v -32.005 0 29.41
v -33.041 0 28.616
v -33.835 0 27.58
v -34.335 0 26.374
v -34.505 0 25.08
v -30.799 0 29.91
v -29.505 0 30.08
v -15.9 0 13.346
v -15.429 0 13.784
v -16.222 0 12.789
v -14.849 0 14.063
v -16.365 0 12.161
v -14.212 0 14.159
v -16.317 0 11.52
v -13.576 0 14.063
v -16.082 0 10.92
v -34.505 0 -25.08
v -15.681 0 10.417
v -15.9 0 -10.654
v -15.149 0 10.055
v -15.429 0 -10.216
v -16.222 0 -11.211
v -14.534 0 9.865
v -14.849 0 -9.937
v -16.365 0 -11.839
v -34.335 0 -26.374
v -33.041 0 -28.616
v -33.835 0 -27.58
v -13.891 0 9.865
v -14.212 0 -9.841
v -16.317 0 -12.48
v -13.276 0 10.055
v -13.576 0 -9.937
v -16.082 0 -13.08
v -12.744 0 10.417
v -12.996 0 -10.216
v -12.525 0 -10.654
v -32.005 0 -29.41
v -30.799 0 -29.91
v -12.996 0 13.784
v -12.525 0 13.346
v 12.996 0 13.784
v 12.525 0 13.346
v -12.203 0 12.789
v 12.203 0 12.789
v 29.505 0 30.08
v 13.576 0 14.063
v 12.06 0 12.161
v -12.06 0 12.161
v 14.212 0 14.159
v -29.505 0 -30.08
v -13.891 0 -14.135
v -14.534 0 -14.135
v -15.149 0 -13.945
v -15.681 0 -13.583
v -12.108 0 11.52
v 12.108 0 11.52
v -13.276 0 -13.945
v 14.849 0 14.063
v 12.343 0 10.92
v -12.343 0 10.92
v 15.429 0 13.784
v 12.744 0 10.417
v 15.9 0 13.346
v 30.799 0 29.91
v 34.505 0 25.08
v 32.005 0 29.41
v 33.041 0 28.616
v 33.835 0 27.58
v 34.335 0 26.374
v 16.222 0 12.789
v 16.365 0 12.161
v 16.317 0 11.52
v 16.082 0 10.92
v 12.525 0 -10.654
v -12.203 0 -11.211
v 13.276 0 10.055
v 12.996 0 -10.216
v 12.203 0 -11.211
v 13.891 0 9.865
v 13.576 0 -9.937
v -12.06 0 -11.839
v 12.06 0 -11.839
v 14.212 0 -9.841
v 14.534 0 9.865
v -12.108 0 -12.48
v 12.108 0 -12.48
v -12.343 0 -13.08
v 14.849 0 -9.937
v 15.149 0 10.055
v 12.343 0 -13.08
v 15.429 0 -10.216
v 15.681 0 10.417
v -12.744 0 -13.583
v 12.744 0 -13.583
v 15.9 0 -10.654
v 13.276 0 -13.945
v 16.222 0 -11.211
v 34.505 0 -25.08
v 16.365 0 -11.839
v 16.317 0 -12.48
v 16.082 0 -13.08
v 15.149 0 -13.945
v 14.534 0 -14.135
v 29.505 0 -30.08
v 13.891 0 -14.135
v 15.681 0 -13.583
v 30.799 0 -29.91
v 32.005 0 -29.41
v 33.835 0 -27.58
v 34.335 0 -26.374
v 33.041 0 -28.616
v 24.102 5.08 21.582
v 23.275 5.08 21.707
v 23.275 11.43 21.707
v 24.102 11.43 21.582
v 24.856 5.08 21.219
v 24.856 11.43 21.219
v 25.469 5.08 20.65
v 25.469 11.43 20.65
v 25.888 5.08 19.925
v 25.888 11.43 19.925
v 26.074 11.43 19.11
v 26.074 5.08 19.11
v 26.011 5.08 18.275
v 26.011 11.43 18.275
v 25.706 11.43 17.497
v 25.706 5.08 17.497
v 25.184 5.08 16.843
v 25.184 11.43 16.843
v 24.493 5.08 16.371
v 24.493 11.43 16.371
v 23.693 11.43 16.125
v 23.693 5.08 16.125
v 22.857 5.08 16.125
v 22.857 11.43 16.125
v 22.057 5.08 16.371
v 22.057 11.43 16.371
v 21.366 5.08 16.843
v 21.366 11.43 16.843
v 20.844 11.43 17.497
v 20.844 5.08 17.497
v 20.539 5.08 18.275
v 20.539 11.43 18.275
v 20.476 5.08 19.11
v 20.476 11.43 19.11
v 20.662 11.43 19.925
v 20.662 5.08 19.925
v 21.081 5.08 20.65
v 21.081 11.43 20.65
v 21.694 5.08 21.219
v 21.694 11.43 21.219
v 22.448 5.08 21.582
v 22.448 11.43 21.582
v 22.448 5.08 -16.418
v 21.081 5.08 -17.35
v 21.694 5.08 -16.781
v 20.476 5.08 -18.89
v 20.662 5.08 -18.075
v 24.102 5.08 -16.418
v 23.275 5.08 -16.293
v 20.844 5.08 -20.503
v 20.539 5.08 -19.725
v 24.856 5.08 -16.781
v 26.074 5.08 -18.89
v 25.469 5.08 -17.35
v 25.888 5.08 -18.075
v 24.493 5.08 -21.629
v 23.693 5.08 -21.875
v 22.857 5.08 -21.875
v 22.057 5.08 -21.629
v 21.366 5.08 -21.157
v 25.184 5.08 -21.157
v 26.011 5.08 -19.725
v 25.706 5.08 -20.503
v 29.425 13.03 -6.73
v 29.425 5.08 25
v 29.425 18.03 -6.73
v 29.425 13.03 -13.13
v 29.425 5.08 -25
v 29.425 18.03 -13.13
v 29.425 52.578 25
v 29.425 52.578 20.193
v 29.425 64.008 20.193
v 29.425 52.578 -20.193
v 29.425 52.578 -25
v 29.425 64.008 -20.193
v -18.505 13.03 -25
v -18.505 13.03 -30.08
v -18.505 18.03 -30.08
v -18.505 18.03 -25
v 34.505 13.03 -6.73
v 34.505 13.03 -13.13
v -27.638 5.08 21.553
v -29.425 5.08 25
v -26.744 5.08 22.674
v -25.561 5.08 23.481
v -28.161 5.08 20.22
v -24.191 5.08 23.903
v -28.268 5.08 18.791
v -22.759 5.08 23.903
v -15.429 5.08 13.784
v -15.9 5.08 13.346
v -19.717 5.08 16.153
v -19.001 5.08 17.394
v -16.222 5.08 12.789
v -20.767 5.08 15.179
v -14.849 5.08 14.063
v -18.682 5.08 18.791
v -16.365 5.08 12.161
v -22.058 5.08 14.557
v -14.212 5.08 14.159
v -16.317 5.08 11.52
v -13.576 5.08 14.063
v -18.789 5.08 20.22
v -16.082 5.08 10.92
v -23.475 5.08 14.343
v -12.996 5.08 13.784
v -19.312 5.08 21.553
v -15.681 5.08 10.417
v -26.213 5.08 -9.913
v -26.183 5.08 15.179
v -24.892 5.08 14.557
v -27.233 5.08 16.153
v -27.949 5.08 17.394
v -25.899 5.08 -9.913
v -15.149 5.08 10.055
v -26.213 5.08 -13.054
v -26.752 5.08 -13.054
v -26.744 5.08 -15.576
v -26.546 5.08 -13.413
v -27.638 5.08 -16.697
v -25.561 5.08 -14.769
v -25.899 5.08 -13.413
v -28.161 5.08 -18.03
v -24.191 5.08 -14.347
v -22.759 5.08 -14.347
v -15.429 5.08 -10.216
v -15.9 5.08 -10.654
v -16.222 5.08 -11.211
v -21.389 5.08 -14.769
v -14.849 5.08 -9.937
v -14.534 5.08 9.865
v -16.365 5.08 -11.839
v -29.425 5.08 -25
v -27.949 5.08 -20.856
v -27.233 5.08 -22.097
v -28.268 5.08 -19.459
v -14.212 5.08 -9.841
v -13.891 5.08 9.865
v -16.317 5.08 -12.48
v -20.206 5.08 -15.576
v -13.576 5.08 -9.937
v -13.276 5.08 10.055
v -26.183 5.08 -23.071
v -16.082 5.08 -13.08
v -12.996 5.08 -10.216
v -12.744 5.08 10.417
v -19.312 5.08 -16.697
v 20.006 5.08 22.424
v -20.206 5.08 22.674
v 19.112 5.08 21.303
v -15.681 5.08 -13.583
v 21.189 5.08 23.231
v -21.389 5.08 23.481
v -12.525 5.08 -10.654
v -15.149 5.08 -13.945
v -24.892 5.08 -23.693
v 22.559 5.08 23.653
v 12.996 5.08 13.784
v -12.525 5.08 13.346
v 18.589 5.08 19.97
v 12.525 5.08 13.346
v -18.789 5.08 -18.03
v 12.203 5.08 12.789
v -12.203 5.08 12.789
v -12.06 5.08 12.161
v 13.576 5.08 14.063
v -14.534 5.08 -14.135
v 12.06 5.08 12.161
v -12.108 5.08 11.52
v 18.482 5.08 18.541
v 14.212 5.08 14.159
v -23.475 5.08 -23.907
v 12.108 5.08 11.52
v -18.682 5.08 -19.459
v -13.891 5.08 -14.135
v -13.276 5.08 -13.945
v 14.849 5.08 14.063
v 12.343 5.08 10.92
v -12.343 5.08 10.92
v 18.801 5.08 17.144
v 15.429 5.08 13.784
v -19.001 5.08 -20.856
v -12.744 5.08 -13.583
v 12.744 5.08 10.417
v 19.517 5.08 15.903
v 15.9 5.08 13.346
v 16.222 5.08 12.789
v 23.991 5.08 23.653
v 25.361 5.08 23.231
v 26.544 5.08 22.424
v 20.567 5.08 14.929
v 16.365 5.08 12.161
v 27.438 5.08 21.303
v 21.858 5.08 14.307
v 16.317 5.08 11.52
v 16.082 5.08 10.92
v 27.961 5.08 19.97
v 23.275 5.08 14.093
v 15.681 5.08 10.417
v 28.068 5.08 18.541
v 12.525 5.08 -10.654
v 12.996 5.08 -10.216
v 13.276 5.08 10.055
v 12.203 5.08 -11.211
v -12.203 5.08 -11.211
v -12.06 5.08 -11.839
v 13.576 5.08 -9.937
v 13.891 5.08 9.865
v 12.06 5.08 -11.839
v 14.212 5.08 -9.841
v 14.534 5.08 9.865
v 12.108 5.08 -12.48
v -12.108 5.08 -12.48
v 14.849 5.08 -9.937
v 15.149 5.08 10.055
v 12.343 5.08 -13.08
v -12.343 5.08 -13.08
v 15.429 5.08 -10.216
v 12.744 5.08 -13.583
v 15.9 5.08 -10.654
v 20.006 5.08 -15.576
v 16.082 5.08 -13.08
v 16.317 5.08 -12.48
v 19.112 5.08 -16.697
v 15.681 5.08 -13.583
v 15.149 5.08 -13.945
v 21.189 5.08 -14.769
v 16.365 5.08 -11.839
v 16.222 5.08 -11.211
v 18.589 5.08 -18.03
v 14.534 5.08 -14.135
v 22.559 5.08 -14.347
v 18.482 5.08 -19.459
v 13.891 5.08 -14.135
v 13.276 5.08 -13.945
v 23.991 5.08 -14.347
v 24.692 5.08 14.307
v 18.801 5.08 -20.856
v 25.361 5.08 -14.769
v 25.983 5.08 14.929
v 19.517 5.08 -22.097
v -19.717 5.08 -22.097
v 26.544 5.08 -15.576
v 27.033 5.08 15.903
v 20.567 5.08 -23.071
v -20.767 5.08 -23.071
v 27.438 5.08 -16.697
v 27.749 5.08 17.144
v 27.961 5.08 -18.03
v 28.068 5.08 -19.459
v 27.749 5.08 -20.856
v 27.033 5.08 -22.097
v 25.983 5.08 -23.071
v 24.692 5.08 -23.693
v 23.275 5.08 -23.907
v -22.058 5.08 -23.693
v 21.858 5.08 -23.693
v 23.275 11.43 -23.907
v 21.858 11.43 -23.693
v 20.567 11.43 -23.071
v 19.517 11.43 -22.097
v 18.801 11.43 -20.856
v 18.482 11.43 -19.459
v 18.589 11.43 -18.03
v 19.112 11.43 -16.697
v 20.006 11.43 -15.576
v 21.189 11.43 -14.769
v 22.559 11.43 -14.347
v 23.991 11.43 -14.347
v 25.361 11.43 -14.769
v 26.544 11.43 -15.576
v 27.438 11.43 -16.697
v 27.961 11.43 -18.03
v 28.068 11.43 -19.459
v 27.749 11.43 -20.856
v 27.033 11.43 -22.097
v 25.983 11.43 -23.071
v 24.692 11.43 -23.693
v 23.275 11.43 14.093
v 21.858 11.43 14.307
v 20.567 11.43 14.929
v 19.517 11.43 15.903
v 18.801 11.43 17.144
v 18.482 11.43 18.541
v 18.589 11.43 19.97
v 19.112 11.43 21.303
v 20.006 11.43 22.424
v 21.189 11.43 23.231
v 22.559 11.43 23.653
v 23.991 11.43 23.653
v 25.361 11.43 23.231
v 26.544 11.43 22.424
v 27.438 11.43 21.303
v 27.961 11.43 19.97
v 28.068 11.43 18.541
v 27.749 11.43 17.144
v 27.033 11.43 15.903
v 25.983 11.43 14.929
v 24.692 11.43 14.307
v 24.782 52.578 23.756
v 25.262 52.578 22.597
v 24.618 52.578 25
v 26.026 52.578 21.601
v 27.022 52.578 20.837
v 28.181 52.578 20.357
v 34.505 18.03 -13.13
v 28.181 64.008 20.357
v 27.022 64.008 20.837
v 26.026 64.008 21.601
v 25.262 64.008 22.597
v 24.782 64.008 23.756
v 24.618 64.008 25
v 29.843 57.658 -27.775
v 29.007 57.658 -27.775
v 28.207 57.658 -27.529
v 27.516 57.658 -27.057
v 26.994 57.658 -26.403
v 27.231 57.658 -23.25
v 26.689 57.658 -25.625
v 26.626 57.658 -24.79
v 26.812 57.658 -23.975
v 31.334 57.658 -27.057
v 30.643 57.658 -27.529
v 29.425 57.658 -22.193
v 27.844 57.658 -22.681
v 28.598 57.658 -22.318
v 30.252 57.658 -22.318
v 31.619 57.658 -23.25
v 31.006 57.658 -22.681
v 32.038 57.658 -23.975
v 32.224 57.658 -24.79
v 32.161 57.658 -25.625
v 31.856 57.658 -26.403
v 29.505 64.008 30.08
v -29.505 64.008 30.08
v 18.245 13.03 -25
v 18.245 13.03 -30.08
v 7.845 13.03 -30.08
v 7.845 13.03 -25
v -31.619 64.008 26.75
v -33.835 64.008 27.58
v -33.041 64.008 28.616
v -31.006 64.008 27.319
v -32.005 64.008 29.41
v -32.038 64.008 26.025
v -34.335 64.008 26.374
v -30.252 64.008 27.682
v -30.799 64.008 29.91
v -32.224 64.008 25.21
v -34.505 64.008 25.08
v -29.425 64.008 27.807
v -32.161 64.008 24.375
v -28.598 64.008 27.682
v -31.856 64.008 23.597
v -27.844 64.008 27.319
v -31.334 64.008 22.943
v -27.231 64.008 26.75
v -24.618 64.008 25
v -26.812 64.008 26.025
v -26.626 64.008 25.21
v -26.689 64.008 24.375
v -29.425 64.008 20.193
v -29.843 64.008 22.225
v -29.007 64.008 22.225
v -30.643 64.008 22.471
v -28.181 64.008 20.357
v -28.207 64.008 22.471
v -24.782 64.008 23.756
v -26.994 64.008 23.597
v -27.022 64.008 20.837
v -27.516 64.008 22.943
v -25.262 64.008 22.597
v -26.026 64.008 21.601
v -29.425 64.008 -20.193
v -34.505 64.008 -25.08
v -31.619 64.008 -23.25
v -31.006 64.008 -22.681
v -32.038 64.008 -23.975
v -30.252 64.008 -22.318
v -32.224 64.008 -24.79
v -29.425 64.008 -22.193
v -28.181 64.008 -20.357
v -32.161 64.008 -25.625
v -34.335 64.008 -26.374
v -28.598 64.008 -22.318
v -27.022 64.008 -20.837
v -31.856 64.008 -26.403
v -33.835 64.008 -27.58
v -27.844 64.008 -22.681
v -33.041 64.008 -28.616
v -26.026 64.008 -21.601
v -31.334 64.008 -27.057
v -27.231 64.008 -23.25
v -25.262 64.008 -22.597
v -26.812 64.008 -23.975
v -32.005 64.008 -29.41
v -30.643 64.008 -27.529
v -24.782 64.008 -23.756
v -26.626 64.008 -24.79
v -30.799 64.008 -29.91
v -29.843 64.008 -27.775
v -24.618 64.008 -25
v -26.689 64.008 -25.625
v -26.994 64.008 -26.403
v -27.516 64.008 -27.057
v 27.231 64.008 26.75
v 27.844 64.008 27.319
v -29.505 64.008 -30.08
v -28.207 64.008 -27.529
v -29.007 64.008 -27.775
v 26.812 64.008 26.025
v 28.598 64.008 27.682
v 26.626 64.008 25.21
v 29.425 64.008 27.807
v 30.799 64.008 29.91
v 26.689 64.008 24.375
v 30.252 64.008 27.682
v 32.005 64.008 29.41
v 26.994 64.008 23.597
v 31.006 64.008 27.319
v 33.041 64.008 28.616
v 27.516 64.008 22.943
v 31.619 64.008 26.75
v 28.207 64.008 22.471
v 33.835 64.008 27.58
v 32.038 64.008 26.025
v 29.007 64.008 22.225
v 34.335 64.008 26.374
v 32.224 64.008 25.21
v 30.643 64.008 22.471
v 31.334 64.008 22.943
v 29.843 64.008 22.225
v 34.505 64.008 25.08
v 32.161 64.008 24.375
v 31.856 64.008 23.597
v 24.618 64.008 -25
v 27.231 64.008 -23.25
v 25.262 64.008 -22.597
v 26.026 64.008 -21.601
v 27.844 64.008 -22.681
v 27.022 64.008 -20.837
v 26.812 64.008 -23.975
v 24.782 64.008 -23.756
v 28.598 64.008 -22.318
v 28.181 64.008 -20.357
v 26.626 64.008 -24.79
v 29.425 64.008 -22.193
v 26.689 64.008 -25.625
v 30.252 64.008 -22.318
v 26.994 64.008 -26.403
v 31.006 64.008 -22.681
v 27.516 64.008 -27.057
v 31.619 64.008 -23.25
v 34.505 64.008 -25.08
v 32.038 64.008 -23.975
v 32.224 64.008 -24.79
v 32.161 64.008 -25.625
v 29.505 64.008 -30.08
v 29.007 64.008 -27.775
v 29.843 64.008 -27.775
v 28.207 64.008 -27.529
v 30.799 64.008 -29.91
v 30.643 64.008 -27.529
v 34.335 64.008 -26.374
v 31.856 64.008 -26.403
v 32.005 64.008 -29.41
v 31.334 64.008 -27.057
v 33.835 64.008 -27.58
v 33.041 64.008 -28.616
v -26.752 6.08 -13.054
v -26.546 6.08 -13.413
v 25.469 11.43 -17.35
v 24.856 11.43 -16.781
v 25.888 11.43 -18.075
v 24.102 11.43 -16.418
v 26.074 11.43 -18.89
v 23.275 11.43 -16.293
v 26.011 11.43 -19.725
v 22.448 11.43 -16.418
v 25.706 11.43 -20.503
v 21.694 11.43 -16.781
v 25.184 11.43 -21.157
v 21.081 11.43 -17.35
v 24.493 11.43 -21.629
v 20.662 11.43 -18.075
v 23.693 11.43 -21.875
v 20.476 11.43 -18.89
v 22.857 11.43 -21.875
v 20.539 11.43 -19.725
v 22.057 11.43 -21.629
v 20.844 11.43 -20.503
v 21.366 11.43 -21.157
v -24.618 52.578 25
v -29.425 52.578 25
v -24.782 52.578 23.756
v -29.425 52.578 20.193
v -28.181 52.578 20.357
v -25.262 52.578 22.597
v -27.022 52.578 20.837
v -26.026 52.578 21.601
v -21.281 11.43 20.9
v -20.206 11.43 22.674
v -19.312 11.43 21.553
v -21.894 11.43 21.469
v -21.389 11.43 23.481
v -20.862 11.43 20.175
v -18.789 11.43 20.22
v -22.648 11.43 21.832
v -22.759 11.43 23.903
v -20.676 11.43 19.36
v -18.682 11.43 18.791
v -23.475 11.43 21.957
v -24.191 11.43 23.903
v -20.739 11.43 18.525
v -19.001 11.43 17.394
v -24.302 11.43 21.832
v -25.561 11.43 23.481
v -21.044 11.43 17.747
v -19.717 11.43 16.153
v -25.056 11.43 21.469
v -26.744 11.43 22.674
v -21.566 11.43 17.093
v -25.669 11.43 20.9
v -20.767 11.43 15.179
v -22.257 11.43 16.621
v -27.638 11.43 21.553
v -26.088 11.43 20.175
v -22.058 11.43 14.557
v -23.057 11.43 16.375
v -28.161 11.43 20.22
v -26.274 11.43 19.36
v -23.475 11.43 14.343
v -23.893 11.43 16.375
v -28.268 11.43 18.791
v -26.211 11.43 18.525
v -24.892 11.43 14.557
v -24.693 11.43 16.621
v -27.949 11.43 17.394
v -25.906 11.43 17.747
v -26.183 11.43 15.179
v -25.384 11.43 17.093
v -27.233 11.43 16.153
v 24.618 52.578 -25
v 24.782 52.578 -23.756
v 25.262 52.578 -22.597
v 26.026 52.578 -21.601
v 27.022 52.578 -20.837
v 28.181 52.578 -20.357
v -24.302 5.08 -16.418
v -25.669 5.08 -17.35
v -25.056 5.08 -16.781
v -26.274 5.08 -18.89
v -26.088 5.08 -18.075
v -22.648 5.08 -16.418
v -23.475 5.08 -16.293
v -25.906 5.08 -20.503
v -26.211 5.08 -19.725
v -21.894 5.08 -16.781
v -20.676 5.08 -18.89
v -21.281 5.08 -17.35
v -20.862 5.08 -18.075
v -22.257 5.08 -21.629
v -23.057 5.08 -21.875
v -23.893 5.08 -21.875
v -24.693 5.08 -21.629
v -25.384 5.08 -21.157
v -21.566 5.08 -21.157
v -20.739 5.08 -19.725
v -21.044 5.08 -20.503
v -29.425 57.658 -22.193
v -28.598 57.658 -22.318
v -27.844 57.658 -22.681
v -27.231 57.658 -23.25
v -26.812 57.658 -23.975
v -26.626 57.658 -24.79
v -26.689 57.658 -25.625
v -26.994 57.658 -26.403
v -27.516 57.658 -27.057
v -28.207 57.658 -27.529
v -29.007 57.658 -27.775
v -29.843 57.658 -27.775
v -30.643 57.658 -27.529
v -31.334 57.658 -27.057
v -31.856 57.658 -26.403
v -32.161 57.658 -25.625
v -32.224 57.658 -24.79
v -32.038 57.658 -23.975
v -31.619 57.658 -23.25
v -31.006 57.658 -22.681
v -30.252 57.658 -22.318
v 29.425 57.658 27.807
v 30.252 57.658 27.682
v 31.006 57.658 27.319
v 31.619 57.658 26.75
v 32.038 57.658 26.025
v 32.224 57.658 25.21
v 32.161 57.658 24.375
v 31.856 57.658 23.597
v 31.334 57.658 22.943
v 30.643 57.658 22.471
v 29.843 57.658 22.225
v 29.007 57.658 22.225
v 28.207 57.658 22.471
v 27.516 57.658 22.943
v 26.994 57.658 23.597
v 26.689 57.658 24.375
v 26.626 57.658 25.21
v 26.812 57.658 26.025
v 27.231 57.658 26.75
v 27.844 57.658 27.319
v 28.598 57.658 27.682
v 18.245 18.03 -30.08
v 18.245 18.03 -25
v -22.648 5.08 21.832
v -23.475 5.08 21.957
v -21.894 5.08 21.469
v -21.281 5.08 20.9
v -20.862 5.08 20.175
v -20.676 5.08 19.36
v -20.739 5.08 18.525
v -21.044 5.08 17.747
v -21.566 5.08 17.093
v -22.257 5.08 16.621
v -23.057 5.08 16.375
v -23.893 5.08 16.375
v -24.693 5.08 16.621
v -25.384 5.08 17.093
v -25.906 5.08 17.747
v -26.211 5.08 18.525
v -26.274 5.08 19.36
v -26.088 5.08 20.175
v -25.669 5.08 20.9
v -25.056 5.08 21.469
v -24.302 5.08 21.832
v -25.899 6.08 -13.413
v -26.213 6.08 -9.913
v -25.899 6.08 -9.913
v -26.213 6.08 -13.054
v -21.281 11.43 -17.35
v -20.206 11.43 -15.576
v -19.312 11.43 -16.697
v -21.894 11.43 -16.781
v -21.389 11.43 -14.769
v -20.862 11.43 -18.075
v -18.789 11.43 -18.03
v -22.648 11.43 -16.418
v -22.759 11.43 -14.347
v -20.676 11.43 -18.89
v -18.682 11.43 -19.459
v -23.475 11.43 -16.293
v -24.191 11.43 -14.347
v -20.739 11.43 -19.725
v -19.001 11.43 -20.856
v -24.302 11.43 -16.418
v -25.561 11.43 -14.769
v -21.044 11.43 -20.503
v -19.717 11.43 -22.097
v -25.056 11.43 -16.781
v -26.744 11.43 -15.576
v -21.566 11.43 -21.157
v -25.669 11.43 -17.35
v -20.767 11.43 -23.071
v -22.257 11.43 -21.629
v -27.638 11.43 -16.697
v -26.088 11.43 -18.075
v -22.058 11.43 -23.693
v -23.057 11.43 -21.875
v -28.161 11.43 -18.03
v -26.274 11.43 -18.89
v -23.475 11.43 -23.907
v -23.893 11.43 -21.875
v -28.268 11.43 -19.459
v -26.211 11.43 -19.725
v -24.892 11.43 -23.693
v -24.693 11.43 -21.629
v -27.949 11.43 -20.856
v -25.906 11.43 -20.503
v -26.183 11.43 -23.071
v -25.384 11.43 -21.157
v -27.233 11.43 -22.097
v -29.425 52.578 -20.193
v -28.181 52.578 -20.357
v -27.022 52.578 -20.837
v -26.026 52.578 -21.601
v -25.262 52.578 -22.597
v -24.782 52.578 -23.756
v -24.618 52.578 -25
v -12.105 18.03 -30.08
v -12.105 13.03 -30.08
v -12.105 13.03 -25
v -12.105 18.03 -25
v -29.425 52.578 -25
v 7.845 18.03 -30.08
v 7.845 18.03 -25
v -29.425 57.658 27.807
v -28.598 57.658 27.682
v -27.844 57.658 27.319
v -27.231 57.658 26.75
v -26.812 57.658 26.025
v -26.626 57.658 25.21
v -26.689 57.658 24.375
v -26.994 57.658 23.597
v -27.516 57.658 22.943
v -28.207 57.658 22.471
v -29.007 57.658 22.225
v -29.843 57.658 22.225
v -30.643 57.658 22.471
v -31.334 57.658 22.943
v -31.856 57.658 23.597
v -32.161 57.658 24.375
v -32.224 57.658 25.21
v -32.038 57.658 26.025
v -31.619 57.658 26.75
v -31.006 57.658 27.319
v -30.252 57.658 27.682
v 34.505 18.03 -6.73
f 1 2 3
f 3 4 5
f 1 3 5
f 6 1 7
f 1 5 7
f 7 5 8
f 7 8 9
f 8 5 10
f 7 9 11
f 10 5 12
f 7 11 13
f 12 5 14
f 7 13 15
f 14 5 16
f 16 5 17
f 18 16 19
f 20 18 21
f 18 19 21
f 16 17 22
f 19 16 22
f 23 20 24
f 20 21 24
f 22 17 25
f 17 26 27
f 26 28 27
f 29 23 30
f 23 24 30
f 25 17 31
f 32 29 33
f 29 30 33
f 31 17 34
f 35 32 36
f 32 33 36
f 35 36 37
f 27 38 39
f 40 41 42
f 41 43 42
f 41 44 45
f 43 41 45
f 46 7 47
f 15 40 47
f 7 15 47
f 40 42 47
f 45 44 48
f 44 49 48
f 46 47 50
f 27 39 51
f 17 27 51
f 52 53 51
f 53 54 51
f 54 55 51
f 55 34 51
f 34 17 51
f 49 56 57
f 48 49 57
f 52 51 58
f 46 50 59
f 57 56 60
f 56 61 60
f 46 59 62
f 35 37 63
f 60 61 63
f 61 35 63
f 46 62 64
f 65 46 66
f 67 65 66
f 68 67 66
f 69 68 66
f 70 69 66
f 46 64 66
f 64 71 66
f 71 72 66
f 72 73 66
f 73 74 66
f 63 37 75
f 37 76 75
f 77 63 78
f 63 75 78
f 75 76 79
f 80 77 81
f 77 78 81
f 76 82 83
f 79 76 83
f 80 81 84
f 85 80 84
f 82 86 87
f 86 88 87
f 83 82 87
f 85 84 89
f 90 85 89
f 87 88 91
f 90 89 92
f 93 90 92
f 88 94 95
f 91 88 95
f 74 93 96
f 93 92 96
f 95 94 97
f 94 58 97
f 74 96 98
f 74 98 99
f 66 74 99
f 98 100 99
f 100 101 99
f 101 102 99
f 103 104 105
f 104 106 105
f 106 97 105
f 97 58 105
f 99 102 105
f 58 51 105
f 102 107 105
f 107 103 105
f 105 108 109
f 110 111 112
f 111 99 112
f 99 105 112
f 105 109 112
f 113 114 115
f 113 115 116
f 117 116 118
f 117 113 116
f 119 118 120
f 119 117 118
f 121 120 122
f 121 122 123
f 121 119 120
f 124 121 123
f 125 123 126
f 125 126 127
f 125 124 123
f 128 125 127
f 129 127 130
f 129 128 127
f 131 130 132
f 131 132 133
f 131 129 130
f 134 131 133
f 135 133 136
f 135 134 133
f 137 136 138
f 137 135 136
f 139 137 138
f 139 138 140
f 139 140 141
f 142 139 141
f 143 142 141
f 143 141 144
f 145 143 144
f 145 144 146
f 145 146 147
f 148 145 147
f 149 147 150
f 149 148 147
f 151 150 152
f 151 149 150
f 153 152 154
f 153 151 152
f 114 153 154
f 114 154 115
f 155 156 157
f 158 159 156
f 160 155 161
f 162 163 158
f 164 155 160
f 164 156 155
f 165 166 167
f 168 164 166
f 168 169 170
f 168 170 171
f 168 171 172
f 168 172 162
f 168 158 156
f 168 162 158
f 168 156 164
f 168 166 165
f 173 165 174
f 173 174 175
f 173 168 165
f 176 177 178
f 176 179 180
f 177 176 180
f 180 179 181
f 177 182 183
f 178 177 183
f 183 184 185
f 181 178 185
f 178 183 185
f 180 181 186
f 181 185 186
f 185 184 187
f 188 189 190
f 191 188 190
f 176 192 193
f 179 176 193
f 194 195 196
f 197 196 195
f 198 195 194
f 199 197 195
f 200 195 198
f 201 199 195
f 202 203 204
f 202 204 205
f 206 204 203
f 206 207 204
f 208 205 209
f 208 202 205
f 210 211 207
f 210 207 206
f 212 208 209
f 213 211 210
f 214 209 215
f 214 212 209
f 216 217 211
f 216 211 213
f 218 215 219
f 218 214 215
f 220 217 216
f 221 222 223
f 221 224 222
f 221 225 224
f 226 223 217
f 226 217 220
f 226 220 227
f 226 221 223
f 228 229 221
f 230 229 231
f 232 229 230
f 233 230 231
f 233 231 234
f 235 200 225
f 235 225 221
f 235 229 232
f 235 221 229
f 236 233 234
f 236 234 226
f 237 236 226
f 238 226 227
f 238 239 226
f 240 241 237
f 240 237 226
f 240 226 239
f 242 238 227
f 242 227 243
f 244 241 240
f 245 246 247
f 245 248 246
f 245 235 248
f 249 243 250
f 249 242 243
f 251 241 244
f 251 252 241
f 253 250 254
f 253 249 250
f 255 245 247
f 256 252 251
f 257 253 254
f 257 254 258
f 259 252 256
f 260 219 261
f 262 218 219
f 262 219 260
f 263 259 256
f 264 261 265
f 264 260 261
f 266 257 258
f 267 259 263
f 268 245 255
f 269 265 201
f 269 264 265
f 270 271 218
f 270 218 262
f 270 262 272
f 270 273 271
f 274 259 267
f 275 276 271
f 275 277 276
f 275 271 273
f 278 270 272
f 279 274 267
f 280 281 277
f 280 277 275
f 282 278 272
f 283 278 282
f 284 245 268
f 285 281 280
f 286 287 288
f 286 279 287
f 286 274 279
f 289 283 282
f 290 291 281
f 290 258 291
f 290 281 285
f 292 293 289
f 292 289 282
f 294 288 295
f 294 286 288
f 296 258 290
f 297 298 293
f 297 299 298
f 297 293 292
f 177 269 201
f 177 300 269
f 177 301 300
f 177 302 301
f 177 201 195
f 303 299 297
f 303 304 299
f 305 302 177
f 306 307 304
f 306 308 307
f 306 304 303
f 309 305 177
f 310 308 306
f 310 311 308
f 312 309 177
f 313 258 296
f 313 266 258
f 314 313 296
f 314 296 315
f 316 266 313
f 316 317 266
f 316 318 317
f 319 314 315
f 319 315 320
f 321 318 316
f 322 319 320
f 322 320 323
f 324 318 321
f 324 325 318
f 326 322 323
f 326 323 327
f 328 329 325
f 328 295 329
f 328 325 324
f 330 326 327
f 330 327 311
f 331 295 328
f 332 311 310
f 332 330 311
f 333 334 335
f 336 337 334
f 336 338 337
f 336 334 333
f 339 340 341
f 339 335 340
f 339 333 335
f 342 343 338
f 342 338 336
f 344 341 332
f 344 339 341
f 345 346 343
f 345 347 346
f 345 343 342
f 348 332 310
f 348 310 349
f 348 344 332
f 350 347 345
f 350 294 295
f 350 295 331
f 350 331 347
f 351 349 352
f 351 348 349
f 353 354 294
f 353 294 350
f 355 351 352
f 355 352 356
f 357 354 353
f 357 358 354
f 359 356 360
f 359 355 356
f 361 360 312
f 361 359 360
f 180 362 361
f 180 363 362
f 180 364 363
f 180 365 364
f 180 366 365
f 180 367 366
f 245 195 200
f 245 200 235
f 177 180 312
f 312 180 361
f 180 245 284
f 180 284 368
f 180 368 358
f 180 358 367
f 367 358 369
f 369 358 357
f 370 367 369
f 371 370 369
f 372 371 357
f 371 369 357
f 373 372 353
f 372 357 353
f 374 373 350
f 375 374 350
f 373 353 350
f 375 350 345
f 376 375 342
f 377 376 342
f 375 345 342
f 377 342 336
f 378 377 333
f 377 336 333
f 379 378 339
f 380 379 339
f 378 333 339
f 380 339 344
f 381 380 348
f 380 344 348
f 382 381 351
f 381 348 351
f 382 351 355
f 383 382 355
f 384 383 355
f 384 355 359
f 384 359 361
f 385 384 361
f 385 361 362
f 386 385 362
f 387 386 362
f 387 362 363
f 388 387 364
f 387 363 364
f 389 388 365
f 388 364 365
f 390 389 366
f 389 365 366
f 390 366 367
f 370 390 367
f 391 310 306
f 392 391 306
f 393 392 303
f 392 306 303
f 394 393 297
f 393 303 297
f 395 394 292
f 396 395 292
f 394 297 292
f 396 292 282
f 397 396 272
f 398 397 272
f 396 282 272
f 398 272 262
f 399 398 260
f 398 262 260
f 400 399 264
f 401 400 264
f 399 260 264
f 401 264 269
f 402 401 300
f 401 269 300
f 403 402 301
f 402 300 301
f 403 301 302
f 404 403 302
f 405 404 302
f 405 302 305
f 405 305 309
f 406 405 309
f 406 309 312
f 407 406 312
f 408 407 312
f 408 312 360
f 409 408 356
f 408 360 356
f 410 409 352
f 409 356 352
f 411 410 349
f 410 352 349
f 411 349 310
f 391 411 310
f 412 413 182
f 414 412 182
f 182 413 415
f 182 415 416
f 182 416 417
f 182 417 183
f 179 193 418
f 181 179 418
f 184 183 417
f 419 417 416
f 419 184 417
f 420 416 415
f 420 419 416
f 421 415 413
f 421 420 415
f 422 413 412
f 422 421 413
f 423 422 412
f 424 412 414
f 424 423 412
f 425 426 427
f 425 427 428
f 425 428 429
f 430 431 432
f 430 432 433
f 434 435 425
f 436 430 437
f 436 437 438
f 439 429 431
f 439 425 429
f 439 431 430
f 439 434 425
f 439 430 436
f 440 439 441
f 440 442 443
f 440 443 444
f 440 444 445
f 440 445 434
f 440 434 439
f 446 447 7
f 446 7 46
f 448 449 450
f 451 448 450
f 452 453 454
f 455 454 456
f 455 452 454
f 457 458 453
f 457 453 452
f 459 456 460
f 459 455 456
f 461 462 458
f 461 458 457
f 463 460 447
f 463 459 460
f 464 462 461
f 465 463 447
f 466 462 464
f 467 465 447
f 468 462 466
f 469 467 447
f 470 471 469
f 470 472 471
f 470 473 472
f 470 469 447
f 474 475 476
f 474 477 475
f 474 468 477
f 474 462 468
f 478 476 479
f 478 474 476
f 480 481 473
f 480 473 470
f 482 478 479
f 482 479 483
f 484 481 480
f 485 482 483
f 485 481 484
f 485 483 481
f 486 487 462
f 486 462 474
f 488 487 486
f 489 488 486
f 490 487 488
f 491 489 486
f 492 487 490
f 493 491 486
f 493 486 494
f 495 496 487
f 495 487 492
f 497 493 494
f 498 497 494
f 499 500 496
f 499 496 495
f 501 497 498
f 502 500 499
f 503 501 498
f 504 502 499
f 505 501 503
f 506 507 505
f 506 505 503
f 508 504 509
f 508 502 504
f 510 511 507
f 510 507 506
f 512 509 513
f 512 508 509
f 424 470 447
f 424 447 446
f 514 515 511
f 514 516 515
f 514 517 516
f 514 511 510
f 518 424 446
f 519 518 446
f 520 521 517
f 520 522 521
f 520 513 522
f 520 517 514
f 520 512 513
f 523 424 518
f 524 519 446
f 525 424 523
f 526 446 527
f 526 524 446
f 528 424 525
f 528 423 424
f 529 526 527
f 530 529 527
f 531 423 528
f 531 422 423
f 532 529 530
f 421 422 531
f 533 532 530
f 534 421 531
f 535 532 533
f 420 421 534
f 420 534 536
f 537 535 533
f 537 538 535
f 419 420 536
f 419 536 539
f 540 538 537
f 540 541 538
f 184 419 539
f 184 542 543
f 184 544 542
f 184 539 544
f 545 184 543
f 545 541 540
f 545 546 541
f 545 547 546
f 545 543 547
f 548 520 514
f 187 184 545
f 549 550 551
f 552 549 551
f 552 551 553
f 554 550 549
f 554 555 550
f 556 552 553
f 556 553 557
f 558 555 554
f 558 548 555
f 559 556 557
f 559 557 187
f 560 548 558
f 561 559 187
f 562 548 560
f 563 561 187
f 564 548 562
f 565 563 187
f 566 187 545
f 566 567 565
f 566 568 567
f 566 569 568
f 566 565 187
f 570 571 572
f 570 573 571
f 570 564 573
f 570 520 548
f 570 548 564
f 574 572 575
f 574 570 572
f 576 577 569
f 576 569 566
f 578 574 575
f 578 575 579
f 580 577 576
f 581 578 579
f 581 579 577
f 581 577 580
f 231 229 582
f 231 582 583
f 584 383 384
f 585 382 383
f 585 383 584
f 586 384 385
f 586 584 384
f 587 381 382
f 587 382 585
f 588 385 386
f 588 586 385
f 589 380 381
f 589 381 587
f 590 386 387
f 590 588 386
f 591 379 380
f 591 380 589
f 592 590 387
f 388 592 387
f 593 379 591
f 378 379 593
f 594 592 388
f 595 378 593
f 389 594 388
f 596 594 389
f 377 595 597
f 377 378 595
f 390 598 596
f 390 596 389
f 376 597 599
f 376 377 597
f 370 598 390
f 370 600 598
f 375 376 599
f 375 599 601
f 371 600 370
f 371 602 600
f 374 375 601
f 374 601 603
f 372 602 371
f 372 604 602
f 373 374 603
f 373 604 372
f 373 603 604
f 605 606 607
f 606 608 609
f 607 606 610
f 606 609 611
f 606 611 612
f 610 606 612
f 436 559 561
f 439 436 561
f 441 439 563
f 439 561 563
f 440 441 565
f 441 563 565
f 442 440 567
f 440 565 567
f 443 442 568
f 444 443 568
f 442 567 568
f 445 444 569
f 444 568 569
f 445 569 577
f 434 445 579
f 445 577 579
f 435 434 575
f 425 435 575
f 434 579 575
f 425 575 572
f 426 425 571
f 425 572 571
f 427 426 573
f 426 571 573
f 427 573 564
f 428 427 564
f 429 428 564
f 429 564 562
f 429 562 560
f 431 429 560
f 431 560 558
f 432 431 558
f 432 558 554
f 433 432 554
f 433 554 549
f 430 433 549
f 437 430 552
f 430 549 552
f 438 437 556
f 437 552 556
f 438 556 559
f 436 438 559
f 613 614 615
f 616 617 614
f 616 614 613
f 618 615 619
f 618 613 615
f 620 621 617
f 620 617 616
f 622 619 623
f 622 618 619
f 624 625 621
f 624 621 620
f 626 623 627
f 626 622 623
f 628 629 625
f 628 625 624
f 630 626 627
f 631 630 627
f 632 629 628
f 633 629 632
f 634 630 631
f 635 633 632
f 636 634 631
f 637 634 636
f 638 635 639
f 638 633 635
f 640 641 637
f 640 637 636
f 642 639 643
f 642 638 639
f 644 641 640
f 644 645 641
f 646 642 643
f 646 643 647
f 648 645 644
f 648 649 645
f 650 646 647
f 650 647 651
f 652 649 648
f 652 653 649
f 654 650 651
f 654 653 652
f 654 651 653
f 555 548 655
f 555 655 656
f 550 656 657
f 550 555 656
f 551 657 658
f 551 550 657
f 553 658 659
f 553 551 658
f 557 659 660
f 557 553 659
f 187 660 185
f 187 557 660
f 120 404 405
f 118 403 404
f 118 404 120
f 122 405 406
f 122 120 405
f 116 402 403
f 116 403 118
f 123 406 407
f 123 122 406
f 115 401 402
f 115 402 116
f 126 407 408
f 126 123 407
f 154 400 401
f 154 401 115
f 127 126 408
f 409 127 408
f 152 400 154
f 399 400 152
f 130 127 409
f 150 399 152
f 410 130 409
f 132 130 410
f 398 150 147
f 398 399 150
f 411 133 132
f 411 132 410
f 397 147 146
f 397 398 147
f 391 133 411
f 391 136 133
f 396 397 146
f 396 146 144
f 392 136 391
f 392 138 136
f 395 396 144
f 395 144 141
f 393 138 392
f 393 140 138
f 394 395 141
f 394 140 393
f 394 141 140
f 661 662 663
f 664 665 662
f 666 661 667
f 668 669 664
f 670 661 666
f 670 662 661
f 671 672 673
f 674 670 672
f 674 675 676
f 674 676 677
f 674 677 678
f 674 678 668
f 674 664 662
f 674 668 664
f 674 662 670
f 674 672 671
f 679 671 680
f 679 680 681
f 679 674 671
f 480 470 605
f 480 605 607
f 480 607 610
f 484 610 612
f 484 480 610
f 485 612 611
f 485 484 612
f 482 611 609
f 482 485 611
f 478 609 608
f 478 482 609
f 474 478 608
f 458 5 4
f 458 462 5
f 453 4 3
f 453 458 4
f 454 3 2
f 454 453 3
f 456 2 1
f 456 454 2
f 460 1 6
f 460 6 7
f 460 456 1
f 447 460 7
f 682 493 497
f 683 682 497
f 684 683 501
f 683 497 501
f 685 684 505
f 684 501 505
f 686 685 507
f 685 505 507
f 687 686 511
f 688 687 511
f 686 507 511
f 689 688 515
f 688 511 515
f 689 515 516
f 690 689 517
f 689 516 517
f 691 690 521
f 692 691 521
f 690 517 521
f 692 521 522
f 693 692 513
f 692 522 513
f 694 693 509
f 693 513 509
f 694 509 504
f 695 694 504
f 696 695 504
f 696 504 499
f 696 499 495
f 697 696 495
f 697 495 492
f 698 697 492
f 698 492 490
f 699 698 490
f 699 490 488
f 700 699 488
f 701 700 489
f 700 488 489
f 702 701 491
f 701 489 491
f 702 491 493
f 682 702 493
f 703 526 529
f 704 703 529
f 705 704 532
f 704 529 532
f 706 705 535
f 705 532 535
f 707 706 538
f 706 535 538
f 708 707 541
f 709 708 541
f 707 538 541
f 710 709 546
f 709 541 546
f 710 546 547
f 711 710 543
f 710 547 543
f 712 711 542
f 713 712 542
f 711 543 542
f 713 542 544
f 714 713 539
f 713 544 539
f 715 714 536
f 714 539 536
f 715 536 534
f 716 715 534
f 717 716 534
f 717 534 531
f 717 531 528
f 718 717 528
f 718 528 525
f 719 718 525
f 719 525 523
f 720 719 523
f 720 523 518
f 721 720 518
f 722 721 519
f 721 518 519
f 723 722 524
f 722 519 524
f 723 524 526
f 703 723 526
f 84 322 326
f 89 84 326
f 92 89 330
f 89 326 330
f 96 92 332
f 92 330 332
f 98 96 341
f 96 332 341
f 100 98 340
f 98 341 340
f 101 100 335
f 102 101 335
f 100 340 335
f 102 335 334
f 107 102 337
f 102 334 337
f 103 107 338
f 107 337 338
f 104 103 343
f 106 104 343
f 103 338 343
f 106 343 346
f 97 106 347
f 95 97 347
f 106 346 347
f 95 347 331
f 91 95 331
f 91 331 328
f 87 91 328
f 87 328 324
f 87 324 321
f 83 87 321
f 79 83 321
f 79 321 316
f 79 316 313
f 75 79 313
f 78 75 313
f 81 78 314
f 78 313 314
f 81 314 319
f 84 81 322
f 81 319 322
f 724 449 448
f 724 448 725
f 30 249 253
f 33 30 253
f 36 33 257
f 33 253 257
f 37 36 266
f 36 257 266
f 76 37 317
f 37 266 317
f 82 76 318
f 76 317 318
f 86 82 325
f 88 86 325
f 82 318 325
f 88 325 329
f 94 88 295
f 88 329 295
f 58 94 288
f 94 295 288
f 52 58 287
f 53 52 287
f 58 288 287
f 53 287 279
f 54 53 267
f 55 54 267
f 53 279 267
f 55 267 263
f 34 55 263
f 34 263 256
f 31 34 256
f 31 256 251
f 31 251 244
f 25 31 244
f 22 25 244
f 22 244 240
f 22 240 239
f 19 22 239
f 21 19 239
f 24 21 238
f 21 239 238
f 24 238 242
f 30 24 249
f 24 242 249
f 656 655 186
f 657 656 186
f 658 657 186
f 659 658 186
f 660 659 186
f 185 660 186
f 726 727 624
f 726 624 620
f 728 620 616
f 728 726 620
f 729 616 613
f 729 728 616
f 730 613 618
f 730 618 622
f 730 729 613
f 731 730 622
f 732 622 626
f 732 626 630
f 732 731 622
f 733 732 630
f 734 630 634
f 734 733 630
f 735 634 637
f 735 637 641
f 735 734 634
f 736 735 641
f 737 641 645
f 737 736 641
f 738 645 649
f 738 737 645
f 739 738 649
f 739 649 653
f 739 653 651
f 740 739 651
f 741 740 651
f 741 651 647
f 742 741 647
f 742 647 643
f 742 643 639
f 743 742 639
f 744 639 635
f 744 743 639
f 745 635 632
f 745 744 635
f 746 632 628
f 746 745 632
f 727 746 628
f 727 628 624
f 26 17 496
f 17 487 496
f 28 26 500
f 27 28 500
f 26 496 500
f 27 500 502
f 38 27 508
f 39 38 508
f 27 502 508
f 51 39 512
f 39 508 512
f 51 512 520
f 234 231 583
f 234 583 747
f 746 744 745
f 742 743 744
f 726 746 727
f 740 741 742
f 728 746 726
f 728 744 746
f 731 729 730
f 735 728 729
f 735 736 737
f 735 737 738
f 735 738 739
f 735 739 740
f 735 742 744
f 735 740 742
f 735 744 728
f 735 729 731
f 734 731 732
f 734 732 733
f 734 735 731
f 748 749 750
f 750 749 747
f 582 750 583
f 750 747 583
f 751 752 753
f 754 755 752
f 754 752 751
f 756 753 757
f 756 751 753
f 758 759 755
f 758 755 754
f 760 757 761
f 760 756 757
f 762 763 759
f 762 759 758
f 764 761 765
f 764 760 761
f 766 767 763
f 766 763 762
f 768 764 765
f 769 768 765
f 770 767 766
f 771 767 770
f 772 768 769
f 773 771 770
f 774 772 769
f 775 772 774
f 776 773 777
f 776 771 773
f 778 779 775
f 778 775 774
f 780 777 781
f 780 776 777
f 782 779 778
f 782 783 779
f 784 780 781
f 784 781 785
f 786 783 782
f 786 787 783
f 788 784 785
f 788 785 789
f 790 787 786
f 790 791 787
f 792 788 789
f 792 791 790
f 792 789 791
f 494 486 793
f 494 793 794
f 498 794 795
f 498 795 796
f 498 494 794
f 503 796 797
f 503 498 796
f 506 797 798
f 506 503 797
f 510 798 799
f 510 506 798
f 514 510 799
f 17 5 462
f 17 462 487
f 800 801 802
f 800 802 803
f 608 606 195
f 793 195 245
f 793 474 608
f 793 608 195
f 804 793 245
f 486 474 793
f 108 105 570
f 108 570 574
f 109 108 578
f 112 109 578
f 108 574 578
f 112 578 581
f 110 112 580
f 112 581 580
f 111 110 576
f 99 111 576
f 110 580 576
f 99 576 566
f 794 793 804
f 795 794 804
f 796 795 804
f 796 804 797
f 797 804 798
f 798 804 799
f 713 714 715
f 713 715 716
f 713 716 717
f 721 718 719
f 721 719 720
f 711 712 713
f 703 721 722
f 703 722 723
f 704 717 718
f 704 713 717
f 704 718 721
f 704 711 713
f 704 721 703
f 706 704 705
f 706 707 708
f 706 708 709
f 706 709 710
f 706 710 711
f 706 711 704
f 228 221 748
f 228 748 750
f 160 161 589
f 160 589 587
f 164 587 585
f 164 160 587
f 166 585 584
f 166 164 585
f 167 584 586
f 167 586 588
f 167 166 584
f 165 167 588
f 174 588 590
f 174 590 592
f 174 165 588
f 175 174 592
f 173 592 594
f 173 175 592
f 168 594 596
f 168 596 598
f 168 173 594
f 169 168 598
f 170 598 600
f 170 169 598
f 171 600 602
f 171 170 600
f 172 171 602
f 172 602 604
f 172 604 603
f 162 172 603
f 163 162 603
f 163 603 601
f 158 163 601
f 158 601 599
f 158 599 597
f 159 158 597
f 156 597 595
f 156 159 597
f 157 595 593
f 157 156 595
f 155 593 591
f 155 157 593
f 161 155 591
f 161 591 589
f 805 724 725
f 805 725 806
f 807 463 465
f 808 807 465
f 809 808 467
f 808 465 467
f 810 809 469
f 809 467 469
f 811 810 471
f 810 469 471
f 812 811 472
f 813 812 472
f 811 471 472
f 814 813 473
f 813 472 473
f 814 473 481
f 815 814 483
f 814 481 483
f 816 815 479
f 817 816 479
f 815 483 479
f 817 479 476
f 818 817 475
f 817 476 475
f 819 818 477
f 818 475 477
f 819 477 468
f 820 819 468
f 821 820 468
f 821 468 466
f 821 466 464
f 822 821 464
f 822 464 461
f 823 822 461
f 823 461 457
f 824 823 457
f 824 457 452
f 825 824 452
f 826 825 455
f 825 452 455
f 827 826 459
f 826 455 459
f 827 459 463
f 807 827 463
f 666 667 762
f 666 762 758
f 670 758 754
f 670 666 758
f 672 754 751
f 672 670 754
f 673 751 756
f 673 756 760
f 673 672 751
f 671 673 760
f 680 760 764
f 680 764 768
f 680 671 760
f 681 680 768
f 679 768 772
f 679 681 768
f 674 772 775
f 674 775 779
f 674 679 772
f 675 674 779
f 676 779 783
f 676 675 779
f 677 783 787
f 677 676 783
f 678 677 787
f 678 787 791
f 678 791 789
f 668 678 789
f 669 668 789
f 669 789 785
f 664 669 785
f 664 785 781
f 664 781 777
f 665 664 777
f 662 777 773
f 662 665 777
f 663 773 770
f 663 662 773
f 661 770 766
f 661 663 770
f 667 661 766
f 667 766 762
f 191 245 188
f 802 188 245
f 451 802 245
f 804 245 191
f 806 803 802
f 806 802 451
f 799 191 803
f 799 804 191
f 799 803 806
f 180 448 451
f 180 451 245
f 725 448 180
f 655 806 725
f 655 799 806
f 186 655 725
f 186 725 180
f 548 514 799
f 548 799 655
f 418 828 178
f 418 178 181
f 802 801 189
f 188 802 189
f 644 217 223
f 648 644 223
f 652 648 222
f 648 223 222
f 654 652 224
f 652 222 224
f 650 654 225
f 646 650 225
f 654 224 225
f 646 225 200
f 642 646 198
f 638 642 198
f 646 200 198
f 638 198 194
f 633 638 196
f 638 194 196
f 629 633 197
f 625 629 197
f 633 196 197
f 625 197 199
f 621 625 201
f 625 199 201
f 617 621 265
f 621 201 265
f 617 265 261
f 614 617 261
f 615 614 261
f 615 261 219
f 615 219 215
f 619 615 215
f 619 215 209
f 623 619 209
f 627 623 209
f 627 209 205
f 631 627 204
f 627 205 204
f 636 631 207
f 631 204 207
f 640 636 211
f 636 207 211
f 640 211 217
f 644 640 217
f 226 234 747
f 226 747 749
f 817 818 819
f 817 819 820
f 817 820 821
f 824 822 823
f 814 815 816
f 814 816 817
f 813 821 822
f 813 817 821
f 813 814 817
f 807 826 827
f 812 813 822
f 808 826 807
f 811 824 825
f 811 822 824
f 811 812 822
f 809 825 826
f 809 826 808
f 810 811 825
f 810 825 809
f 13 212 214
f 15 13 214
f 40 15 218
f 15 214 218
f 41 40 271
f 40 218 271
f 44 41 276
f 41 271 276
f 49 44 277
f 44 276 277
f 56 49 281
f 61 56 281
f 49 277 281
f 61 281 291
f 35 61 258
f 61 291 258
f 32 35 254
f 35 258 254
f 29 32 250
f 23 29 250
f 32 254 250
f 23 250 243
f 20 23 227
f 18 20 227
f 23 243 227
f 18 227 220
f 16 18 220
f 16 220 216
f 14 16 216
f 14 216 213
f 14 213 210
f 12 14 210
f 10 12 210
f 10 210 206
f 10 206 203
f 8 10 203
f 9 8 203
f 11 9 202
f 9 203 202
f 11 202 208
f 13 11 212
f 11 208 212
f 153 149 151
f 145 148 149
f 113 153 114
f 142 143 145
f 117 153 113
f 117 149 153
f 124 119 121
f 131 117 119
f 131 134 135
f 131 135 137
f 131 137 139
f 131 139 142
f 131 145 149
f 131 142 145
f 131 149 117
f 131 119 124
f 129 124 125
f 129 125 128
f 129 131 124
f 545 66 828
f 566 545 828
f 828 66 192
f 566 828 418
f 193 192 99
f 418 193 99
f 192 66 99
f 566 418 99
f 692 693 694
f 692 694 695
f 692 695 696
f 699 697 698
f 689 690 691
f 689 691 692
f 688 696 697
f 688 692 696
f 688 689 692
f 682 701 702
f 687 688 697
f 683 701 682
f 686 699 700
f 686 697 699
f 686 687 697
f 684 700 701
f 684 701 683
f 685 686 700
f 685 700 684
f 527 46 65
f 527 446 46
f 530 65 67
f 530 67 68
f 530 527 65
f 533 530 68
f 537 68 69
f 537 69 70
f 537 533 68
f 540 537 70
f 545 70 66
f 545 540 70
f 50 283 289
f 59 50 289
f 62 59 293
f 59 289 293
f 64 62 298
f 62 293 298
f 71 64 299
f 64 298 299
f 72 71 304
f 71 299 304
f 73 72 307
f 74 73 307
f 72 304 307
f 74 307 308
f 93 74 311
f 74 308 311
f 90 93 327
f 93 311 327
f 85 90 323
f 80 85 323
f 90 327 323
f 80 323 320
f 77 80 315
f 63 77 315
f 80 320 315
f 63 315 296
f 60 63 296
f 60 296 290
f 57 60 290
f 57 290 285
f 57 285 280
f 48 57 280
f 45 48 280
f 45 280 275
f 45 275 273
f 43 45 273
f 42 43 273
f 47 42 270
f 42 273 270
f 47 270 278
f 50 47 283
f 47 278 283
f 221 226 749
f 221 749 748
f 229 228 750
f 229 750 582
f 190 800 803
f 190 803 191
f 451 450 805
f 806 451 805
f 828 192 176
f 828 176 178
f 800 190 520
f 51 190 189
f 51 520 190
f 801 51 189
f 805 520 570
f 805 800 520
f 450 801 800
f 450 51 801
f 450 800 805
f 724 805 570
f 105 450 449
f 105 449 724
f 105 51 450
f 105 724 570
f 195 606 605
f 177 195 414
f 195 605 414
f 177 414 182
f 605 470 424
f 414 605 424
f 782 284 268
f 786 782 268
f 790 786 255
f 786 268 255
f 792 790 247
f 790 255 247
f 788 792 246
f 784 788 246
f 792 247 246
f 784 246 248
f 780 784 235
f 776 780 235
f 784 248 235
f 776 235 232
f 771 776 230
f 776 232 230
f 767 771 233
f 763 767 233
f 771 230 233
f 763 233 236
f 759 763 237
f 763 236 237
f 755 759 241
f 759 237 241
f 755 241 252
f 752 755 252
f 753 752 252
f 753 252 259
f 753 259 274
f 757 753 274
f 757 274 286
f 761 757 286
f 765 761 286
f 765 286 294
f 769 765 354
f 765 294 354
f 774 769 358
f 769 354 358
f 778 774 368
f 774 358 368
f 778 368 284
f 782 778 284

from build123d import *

# Parameters (mm, degrees)
SKETCH1_W                  = 69.01
SKETCH1_H                  = 60.16
BOSS_EXTRUDE3_DEPTH        = 64.008
SKETCH2_W                  = 58.85
SKETCH2_H                  = 50
CUT_EXTRUDE4_DEPTH         = 58.928
FILLET1_R                  = 5
SKETCH3_R                  = 4.8067
BOSS_EXTRUDE4_DEPTH        = 11.43
SKETCH3_3_R                = 2.8067
CUT_EXTRUDE5_DEPTH         = 6.35
SKETCH9_R                  = 4.8067
SKETCH9_R_2                = 2.8067
BOSS_EXTRUDE5_DEPTH        = 6.35
SKETCH10_R                 = 2.159
CUT_EXTRUDE6_DEPTH         = 5.08
BOSS_EXTRUDE6_DEPTH        = 1
FACE_2_CONNECTOR_HOLES_W   = 6.4
FACE_2_CONNECTOR_HOLES_H   = 5
FACE_2_CONNECTOR_HOLES_W_2 = 10.4
CUT_EXTRUDE7_DEPTH         = 5.08
FACE_3_CONNECTOR_HOLES_W   = 6.4
FACE_3_CONNECTOR_HOLES_H   = 5
CUT_EXTRUDE8_DEPTH         = 5.08


with BuildPart() as part:
    # Sketch1 → Boss-Extrude3 (new body)
    with BuildSketch(Plane(origin=(0, 0, 0), x_dir=(1, 0, 0), z_dir=(0, 1, 0))):
        Rectangle(SKETCH1_W, SKETCH1_H)
    extrude(amount=BOSS_EXTRUDE3_DEPTH)

    # Sketch2 → Cut-Extrude4 (cut)
    with BuildSketch(Plane(origin=(0, 64.008, 0), x_dir=(1, 0, 0), z_dir=(0, 1, 0))):
        Rectangle(SKETCH2_W, SKETCH2_H)
    extrude(amount=-CUT_EXTRUDE4_DEPTH, mode=Mode.SUBTRACT)

    # Fillet1
    fillet1_edges = [part.edges().sort_by_distance(p)[0] for p in [
        (-34.505, 32.004, 30.08),
        (34.505, 32.004, 30.08),
        (34.505, 32.004, -30.08),
        (-34.505, 32.004, -30.08),
    ]]
    fillet(fillet1_edges, radius=FILLET1_R)

    # Sketch3 → Boss-Extrude4 (add)
    with BuildSketch(Plane(origin=(0, 64.008, 0), x_dir=(1, 0, 0), z_dir=(0, 1, 0))):
        with Locations((-29.425, 25)):
            Circle(SKETCH3_R)
        with Locations((29.425, 25)):
            Circle(SKETCH3_R)
        with Locations((-29.425, -25)):
            Circle(SKETCH3_R)
        with Locations((29.425, -25)):
            Circle(SKETCH3_R)
    extrude(amount=-BOSS_EXTRUDE4_DEPTH)

    # Sketch3<3> → Cut-Extrude5 (cut)
    with BuildSketch(Plane(origin=(0, 64.008, 0), x_dir=(1, 0, 0), z_dir=(0, 1, 0))):
        with Locations(Location((-29.425, 25, 0), (0, 0, 270))):
            Circle(SKETCH3_3_R)
        with Locations(Location((29.425, 25, 0), (0, 0, 270))):
            Circle(SKETCH3_3_R)
        with Locations(Location((29.425, -25, 0), (0, 0, 270))):
            Circle(SKETCH3_3_R)
        with Locations(Location((-29.425, -25, 0), (0, 0, 270))):
            Circle(SKETCH3_3_R)
    extrude(amount=-CUT_EXTRUDE5_DEPTH, mode=Mode.SUBTRACT)

    # Sketch9 → Boss-Extrude5 (add)
    # profile 1 of 4: a face of its own
    with BuildSketch(Plane(origin=(0, 5.08, 0), x_dir=(1, 0, 0), z_dir=(0, 1, 0))):
        with Locations(Location((-23.475, 19.1, 0), (0, 0, 90))):
            Circle(SKETCH9_R)
        with Locations(Location((-23.475, 19.1, 0), (0, 0, 270))):
            Circle(SKETCH9_R_2, mode=Mode.SUBTRACT)
    # profile 2 of 4: a face of its own
    with BuildSketch(Plane(origin=(0, 5.08, 0), x_dir=(1, 0, 0), z_dir=(0, 1, 0))):
        with Locations(Location((23.275, 19.1, 0), (0, 0, 90))):
            Circle(SKETCH9_R)
        with Locations(Location((23.275, 19.1, 0), (0, 0, 270))):
            Circle(SKETCH9_R_2, mode=Mode.SUBTRACT)
    # profile 3 of 4: a face of its own
    with BuildSketch(Plane(origin=(0, 5.08, 0), x_dir=(1, 0, 0), z_dir=(0, 1, 0))):
        with Locations(Location((23.275, -18.9, 0), (0, 0, 90))):
            Circle(SKETCH9_R)
        with Locations(Location((23.275, -18.9, 0), (0, 0, 270))):
            Circle(SKETCH9_R_2, mode=Mode.SUBTRACT)
    # profile 4 of 4: a face of its own
    with BuildSketch(Plane(origin=(0, 5.08, 0), x_dir=(1, 0, 0), z_dir=(0, 1, 0))):
        with Locations(Location((-23.475, -19.15, 0), (0, 0, 90))):
            Circle(SKETCH9_R)
        with Locations(Location((-23.475, -19.15, 0), (0, 0, 270))):
            Circle(SKETCH9_R_2, mode=Mode.SUBTRACT)
    extrude(amount=BOSS_EXTRUDE5_DEPTH)

    # Sketch10 → Cut-Extrude6 (cut)
    with BuildSketch(Plane(origin=(0, 5.08, 0), x_dir=(1, 0, 0), z_dir=(0, 1, 0))):
        with Locations(Location((14.2125, 12, 0), (0, 0, 270))):
            Circle(SKETCH10_R)
        with Locations(Location((14.2125, -12, 0), (0, 0, 270))):
            Circle(SKETCH10_R)
        with Locations(Location((-14.2125, 12, 0), (0, 0, 270))):
            Circle(SKETCH10_R)
        with Locations(Location((-14.2125, -12, 0), (0, 0, 270))):
            Circle(SKETCH10_R)
    extrude(amount=-CUT_EXTRUDE6_DEPTH, mode=Mode.SUBTRACT)

    # Sketch12 → Boss-Extrude6 (add)
    with BuildSketch(Plane(origin=(0, 5.08, 0), x_dir=(1, 0, 0), z_dir=(0, 1, 0))):
        Polygon((-26.546494391, 13.413188801), (-25.899358974, 13.413188801), (-25.899358974, 9.913188801), (-26.213461538, 9.913188801), (-26.213461538, 13.054214442), (-26.751923077, 13.054214442), align=None)
    extrude(amount=BOSS_EXTRUDE6_DEPTH)

    # Face 2 Connector Holes → Cut-Extrude7 (cut)
    with BuildSketch(Plane(origin=(0, 0, -30.08), x_dir=(-1, 0, 0), z_dir=(0, 0, -1))):
        with Locations((15.305, 15.53)):
            Rectangle(FACE_2_CONNECTOR_HOLES_W, FACE_2_CONNECTOR_HOLES_H)
        with Locations((-13.045, 15.53)):
            Rectangle(FACE_2_CONNECTOR_HOLES_W_2, FACE_2_CONNECTOR_HOLES_H)
    extrude(amount=-CUT_EXTRUDE7_DEPTH, mode=Mode.SUBTRACT)

    # Face 3 Connector Holes → Cut-Extrude8 (cut)
    with BuildSketch(Plane(origin=(34.505, 0, 0), x_dir=(0, 0, -1), z_dir=(1, 0, 0))):
        with Locations((9.93, 15.53)):
            Rectangle(FACE_3_CONNECTOR_HOLES_W, FACE_3_CONNECTOR_HOLES_H)
    extrude(amount=-CUT_EXTRUDE8_DEPTH, mode=Mode.SUBTRACT)


solid = part.part
